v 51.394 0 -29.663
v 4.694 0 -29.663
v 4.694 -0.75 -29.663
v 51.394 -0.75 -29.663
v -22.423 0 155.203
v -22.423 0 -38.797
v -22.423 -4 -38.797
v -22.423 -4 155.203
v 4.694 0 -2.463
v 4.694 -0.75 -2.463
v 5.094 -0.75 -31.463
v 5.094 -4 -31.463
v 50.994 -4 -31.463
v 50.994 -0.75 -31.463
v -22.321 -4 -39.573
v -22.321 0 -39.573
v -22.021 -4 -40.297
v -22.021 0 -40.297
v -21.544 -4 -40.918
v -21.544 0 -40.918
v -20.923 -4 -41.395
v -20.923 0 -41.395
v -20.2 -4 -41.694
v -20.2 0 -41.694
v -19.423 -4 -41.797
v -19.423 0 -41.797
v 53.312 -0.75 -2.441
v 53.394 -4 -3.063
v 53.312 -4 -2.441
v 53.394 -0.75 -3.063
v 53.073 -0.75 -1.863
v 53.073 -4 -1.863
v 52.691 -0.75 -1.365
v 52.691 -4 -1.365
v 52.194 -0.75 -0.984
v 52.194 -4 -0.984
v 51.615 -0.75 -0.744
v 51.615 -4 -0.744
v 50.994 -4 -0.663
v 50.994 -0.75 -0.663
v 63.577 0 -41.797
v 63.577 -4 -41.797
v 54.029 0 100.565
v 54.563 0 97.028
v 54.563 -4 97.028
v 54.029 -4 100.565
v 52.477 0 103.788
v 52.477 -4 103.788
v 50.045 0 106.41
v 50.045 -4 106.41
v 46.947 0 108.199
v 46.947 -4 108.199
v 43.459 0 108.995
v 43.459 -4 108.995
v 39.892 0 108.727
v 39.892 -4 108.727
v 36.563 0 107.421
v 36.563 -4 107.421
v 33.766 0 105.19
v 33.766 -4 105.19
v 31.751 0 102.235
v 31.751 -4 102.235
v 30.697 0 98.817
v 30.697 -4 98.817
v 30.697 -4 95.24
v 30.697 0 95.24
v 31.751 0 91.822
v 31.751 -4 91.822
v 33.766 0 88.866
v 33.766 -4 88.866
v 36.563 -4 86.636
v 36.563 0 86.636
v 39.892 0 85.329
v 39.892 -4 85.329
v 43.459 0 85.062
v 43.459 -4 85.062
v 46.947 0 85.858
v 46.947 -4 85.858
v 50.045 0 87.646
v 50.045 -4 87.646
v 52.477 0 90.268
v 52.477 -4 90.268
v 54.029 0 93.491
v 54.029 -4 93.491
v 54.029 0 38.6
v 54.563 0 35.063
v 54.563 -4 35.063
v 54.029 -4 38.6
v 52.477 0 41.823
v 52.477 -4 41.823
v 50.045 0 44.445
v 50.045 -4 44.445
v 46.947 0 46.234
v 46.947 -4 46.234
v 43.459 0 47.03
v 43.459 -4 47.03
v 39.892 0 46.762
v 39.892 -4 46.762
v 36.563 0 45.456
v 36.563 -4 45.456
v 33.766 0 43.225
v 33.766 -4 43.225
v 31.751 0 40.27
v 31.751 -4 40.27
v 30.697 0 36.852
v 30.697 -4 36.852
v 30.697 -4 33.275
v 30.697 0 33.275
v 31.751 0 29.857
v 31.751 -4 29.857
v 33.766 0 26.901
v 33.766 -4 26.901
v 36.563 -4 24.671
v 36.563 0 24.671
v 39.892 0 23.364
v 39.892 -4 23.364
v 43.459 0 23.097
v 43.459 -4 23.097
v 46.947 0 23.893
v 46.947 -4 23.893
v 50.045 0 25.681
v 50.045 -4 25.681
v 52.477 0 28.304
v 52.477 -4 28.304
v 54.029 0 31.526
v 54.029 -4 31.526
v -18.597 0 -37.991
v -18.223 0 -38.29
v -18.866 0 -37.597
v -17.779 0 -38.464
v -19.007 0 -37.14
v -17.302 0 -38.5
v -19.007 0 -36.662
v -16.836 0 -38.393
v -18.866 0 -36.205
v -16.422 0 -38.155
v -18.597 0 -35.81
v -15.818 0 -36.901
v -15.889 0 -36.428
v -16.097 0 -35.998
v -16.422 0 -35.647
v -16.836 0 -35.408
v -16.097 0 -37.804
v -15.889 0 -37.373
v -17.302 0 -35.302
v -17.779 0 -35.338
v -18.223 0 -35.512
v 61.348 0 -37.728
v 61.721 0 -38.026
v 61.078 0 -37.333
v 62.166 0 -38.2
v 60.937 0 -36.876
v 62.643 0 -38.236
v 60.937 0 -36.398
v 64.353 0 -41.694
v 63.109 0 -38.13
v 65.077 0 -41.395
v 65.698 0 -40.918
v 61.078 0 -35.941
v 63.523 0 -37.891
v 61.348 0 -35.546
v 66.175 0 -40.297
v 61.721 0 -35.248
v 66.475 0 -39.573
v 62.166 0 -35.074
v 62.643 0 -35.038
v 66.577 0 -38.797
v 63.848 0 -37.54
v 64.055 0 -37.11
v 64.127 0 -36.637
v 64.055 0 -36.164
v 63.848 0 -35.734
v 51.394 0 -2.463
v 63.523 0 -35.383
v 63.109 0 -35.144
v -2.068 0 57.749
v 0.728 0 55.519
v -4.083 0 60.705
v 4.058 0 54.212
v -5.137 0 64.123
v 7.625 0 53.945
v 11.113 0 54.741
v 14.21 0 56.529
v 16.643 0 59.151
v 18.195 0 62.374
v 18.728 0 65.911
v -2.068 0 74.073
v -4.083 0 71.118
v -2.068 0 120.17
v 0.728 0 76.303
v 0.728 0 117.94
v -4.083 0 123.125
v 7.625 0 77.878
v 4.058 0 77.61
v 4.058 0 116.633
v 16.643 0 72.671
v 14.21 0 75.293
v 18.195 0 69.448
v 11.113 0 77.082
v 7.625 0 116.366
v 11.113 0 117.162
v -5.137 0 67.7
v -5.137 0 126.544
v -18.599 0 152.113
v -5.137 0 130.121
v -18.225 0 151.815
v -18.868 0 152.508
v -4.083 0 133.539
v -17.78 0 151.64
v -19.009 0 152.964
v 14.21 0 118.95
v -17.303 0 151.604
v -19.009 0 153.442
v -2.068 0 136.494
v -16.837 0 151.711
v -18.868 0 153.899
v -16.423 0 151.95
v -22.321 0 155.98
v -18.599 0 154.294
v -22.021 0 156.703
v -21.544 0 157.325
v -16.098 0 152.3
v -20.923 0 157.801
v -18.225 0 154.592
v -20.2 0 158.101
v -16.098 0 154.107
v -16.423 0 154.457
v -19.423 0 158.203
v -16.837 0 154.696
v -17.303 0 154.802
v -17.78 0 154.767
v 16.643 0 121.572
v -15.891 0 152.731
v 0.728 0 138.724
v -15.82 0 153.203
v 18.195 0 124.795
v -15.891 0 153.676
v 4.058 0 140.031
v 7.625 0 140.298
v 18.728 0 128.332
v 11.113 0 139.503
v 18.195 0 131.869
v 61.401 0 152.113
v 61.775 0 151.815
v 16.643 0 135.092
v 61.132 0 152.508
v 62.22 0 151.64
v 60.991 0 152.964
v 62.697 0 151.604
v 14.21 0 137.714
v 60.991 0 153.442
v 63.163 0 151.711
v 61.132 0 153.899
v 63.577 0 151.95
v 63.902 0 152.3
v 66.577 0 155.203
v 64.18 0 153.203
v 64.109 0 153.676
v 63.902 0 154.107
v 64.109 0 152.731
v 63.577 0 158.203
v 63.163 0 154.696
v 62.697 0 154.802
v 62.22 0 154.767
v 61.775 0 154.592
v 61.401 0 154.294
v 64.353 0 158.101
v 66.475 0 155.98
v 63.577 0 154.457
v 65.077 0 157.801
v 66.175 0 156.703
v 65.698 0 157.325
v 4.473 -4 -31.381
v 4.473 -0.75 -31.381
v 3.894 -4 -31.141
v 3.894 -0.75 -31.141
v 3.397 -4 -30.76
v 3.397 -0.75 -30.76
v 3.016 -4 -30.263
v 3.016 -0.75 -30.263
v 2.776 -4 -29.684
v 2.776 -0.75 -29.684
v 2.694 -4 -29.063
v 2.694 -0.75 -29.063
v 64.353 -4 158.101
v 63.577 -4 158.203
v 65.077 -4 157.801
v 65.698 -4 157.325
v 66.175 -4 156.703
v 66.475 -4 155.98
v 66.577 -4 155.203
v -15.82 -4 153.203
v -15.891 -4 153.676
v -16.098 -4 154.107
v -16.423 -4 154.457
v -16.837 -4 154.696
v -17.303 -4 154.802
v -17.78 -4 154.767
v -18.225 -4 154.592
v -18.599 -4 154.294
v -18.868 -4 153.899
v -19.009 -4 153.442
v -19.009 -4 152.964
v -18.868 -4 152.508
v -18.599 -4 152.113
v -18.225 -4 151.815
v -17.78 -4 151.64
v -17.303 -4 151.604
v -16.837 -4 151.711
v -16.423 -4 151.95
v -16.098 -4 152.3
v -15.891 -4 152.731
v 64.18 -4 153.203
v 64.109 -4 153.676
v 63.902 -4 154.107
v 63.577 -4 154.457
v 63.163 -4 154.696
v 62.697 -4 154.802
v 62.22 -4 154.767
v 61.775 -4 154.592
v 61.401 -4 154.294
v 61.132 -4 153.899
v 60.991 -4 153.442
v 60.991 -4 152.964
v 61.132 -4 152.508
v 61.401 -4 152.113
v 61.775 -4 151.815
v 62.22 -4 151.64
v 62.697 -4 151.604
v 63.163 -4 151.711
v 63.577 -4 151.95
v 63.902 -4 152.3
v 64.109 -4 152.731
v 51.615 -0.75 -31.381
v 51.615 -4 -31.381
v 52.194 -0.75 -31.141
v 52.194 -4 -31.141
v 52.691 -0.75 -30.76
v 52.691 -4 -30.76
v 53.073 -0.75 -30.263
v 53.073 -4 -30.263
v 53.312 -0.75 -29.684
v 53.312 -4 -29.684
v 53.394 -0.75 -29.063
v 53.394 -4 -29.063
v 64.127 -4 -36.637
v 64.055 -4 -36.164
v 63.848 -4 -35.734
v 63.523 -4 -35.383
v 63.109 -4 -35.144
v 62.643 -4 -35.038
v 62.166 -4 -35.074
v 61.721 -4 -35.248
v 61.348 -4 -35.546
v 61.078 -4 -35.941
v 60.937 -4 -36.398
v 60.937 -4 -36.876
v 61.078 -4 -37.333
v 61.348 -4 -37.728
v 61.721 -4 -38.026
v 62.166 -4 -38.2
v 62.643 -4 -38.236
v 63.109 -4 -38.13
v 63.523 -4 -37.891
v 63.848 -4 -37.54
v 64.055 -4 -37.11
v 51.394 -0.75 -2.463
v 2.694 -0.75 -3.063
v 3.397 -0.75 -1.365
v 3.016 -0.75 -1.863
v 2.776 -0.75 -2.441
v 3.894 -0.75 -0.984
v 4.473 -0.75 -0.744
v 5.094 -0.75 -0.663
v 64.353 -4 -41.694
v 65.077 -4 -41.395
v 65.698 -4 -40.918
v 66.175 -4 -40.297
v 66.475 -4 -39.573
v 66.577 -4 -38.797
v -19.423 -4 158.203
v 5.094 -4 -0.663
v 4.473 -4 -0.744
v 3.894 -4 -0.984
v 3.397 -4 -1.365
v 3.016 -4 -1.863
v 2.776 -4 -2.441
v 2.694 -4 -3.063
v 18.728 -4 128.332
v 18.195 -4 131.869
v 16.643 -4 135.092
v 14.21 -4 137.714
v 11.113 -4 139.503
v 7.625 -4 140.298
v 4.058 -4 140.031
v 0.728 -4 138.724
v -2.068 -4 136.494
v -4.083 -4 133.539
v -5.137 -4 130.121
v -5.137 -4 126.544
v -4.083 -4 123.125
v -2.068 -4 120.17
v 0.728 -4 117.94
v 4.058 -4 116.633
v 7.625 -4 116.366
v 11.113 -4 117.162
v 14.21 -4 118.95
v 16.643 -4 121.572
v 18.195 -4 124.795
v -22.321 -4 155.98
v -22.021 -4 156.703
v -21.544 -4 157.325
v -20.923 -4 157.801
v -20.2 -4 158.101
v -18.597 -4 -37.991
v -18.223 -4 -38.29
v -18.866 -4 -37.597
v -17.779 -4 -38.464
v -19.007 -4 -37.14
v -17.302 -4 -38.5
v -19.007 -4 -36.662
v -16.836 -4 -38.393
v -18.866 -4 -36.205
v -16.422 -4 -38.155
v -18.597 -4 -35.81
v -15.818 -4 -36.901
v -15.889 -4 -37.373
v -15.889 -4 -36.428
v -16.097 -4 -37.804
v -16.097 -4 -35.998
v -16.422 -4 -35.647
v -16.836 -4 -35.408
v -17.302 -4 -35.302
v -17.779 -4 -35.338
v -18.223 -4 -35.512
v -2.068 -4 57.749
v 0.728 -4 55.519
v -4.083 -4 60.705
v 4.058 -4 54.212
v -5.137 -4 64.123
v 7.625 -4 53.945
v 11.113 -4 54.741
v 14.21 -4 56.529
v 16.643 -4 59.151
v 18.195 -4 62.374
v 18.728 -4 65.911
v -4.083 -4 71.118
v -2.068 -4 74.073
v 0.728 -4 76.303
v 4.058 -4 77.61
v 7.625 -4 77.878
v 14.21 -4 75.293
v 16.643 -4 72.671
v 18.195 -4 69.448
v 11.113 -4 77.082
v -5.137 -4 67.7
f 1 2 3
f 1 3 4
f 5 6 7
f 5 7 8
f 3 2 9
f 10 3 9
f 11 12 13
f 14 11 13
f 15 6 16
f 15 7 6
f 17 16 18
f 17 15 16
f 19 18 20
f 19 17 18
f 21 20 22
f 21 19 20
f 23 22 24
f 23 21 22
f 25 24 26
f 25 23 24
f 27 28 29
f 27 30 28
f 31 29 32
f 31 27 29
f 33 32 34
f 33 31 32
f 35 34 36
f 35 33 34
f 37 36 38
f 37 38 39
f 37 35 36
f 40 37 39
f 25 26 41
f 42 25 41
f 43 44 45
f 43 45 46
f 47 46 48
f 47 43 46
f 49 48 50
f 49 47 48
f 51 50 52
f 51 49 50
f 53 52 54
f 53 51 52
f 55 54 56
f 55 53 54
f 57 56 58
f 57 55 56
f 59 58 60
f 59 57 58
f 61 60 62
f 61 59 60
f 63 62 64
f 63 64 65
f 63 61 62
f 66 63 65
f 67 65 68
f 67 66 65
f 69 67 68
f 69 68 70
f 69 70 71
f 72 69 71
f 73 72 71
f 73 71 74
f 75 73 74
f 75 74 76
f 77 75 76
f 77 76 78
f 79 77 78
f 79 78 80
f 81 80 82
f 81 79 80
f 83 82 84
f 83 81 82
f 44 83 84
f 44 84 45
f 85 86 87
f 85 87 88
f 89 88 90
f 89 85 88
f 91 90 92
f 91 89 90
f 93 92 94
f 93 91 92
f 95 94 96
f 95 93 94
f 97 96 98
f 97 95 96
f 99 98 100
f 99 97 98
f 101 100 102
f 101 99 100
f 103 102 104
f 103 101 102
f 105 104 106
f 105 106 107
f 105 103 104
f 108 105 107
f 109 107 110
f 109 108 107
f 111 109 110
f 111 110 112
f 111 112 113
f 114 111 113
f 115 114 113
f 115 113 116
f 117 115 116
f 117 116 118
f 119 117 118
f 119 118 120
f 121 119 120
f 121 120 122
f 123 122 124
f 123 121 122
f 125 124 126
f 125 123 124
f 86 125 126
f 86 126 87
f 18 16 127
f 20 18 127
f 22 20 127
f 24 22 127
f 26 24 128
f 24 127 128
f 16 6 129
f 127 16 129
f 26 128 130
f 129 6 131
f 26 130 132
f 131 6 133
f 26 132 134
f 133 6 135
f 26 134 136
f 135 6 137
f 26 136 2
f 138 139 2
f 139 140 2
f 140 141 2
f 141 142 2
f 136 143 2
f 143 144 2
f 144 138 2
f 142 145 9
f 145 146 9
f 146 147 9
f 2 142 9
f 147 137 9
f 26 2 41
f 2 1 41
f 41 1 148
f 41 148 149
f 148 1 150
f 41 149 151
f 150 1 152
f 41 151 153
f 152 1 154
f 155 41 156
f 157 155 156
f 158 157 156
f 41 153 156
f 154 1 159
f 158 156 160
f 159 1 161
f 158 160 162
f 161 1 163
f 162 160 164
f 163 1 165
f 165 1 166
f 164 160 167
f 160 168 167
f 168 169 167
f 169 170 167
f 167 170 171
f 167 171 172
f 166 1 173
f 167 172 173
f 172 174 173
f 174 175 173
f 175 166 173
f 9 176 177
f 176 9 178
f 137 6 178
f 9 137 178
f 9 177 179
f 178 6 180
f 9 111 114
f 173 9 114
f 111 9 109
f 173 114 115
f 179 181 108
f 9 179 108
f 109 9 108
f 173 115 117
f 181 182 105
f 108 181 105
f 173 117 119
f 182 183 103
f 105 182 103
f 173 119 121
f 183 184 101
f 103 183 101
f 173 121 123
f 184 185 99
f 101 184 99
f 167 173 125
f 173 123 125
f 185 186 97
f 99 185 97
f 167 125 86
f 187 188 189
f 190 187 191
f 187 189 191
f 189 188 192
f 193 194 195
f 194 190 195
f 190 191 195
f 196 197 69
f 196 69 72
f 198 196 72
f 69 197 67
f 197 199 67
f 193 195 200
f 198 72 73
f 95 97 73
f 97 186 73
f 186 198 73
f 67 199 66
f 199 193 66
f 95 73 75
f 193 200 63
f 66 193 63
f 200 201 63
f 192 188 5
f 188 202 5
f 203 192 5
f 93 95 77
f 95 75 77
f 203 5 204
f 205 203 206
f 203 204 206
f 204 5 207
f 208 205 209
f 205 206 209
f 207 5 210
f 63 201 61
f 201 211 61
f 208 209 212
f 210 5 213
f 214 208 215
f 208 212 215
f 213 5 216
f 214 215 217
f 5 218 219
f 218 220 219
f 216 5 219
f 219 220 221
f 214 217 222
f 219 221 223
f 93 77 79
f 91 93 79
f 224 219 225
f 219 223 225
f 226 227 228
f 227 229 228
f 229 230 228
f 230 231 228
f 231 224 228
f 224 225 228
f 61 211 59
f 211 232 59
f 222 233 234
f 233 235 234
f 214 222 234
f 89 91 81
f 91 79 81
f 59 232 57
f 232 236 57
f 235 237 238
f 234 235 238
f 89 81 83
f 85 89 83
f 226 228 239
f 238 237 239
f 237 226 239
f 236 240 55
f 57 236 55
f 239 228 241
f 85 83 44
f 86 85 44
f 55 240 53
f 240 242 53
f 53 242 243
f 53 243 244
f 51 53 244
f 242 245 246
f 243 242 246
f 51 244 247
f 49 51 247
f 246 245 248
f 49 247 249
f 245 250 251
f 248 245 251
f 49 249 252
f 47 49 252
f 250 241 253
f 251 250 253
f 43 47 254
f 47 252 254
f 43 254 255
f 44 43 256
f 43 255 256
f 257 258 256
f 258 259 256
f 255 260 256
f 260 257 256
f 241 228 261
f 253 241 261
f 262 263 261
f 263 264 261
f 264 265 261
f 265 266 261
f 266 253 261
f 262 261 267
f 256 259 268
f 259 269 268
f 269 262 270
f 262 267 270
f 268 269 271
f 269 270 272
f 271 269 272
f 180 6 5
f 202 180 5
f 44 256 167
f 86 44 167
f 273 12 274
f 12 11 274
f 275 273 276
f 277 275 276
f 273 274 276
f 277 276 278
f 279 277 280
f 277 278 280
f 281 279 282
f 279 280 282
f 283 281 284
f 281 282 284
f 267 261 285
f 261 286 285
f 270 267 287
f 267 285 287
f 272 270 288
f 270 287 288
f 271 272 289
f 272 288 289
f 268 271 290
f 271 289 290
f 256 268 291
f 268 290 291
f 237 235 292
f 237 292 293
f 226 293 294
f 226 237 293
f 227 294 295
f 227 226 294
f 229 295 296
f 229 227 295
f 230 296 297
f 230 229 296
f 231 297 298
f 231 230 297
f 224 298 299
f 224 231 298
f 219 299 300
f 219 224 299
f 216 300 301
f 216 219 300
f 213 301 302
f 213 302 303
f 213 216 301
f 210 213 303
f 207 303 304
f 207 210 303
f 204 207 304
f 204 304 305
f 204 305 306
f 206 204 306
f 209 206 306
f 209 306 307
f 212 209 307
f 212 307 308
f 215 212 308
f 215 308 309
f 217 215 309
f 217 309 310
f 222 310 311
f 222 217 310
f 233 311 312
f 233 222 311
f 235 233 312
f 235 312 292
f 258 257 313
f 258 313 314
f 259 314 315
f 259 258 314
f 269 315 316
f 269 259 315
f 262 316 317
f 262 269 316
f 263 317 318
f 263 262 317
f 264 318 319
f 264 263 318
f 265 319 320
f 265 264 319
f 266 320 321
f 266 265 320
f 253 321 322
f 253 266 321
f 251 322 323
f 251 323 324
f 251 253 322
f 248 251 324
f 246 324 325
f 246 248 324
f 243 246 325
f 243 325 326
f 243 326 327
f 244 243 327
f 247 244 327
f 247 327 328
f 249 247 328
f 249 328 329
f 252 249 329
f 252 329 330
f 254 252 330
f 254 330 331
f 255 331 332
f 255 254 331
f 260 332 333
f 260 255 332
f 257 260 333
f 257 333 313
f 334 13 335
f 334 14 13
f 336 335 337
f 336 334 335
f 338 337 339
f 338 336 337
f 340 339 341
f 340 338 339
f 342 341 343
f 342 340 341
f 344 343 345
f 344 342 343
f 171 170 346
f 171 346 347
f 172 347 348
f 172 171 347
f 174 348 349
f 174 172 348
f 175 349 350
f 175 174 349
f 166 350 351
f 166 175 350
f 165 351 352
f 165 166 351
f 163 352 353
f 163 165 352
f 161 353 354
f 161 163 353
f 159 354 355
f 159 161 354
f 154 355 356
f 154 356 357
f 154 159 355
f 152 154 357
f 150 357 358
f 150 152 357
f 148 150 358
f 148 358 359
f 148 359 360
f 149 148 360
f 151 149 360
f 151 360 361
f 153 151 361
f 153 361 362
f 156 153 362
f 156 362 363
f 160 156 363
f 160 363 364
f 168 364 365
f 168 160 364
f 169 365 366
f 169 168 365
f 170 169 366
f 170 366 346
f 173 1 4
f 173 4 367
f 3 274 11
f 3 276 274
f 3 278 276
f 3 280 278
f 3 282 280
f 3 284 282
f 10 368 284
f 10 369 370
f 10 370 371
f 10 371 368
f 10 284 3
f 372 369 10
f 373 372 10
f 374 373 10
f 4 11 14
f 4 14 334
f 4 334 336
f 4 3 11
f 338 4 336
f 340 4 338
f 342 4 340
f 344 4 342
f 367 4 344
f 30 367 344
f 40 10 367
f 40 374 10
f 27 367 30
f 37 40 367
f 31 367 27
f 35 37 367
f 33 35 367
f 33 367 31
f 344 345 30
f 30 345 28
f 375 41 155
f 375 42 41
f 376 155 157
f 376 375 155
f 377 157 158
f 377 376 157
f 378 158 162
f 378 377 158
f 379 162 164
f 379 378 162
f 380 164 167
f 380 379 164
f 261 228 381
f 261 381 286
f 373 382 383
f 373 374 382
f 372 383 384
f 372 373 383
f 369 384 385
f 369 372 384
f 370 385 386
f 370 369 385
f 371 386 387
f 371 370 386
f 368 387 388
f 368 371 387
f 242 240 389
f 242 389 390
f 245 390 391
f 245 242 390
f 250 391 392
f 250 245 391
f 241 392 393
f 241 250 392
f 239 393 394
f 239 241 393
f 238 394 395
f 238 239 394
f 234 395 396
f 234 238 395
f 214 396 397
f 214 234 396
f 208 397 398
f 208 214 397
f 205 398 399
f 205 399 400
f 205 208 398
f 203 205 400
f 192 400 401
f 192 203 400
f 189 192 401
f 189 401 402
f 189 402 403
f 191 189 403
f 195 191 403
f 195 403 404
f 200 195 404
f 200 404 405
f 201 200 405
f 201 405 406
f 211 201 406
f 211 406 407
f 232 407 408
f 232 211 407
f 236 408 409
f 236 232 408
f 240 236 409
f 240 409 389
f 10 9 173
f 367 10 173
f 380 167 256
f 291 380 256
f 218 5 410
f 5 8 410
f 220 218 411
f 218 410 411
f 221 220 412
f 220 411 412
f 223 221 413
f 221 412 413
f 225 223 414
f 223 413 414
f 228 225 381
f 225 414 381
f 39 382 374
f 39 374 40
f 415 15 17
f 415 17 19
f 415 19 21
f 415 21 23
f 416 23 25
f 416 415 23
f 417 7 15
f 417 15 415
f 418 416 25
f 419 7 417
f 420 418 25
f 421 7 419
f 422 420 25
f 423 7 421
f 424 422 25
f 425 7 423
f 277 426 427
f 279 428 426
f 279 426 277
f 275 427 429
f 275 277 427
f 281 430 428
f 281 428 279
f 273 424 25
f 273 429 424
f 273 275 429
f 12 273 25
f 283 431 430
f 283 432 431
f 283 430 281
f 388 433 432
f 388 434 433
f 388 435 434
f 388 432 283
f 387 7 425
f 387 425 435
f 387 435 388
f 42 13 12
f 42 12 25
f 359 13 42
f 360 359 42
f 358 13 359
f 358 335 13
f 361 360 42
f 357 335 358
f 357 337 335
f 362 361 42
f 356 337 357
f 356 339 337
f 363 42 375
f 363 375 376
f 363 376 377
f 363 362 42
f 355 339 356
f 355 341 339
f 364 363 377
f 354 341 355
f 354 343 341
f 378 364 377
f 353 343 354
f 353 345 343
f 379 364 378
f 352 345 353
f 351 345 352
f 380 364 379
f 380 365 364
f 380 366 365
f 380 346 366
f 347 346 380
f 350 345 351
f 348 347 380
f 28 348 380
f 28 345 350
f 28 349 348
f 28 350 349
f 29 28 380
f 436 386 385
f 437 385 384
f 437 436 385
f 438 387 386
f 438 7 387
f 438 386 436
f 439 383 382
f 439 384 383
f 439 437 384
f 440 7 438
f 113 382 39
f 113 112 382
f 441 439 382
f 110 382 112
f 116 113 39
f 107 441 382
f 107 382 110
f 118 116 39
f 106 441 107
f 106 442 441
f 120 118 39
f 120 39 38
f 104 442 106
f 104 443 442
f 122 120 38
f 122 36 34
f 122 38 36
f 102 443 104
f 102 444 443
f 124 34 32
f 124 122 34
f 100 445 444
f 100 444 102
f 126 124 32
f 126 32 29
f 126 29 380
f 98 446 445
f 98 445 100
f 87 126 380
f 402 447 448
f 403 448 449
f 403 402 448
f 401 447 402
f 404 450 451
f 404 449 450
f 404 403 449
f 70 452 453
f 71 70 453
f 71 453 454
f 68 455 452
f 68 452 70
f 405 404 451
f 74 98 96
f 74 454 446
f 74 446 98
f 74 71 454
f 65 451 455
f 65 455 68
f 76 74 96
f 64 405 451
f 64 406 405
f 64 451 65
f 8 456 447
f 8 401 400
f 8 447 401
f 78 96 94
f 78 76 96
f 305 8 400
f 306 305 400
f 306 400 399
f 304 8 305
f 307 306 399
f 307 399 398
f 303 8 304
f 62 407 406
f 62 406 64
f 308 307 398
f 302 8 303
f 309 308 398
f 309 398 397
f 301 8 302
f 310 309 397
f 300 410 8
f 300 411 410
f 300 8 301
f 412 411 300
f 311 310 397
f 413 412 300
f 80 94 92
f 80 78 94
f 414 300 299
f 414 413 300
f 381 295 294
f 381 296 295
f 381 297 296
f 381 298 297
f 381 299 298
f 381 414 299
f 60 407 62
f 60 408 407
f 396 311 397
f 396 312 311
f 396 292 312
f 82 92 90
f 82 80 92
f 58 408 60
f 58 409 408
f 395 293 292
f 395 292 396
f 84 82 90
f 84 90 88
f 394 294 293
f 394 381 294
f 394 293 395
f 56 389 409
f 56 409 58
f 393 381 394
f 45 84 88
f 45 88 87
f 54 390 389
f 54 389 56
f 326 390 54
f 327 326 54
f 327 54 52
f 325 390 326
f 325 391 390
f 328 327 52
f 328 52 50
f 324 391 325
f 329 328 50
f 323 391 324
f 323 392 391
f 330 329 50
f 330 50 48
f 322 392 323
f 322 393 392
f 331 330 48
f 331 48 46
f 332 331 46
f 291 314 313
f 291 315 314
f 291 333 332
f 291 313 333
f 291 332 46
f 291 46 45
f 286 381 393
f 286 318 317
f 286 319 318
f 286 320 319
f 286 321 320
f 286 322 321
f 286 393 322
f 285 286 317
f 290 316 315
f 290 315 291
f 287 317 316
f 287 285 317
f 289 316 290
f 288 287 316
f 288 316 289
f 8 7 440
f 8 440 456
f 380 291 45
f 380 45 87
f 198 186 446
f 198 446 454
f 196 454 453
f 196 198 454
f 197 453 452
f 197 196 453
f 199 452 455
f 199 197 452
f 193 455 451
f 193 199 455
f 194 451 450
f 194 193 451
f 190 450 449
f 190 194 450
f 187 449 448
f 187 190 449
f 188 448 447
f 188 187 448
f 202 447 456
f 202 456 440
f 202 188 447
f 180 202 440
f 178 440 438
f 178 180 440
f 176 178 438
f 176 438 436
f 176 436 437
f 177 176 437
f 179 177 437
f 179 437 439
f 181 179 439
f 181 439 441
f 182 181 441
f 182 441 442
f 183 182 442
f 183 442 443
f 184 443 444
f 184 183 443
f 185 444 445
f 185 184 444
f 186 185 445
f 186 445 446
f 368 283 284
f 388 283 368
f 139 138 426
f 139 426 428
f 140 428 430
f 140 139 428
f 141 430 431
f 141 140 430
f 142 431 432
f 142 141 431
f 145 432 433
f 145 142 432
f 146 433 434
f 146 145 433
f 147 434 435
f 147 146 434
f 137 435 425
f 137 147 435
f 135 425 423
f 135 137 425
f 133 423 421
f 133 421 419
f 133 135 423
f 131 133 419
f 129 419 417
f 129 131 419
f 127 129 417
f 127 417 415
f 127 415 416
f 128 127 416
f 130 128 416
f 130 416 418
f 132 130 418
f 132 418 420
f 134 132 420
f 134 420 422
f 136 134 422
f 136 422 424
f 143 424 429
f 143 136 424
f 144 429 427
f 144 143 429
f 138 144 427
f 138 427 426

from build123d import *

# Parameters (mm, degrees)
F0_W     = 89
F0_H     = 200
F0_R     = 1.603513
F0_W_2   = 46.7
F0_H_2   = 27.2
F0_R_2   = 12
F1_DEPTH = 4
F2_R     = 3
F3_W     = 50.7
F3_H     = 30.8
F4_DEPTH = 3.25
F5_R     = 2.4


with BuildPart() as f1:
    # F0 (on Front) → F1 (new body)
    with BuildSketch(Plane.XZ):
        with Locations((22.076878, 58.203301)):
            Rectangle(F0_W, F0_H)
        with Locations((-17.421687, -36.900826)):
            Circle(F0_R, mode=Mode.SUBTRACT)
        with Locations((28.044092, -16.062529)):
            Rectangle(F0_W_2, F0_H_2, mode=Mode.SUBTRACT)
        with Locations((62.523074, -36.637016)):
            Circle(F0_R, mode=Mode.SUBTRACT)
        with Locations((42.562623, 35.063349)):
            Circle(F0_R_2, mode=Mode.SUBTRACT)
        with Locations((6.728478, 65.911161)):
            Circle(F0_R_2, mode=Mode.SUBTRACT)
        with Locations((-17.423122, 153.203301)):
            Circle(F0_R, mode=Mode.SUBTRACT)
        with Locations((6.728478, 128.332034)):
            Circle(F0_R_2, mode=Mode.SUBTRACT)
        with Locations((42.562623, 97.028293)):
            Circle(F0_R_2, mode=Mode.SUBTRACT)
        with Locations((62.576878, 153.203301)):
            Circle(F0_R, mode=Mode.SUBTRACT)
    extrude(amount=F1_DEPTH)

    # F2
    f2_edges = [f1.edges().sort_by_distance(p)[0] for p in [
        (-22.423122, -2, 158.203301),
        (66.576878, -2, 158.203301),
        (66.576878, -2, -41.796699),
        (-22.423122, -2, -41.796699),
    ]]
    fillet(f2_edges, radius=F2_R)

    # F3 (on face) → F4 (cut)
    with BuildSketch(Plane.XZ.offset(4)):
        with Locations((28.044092, -16.062529)):
            Rectangle(F3_W, F3_H)
    extrude(amount=-F4_DEPTH, mode=Mode.SUBTRACT)

    # F5
    f5_edges = [f1.edges().sort_by_distance(p)[0] for p in [
        (2.694092, -2.375, -0.662529),
        (53.394092, -2.375, -31.462529),
        (2.694092, -2.375, -31.462529),
        (53.394092, -2.375, -0.662529),
    ]]
    fillet(f5_edges, radius=F5_R)


solid = f1.part
